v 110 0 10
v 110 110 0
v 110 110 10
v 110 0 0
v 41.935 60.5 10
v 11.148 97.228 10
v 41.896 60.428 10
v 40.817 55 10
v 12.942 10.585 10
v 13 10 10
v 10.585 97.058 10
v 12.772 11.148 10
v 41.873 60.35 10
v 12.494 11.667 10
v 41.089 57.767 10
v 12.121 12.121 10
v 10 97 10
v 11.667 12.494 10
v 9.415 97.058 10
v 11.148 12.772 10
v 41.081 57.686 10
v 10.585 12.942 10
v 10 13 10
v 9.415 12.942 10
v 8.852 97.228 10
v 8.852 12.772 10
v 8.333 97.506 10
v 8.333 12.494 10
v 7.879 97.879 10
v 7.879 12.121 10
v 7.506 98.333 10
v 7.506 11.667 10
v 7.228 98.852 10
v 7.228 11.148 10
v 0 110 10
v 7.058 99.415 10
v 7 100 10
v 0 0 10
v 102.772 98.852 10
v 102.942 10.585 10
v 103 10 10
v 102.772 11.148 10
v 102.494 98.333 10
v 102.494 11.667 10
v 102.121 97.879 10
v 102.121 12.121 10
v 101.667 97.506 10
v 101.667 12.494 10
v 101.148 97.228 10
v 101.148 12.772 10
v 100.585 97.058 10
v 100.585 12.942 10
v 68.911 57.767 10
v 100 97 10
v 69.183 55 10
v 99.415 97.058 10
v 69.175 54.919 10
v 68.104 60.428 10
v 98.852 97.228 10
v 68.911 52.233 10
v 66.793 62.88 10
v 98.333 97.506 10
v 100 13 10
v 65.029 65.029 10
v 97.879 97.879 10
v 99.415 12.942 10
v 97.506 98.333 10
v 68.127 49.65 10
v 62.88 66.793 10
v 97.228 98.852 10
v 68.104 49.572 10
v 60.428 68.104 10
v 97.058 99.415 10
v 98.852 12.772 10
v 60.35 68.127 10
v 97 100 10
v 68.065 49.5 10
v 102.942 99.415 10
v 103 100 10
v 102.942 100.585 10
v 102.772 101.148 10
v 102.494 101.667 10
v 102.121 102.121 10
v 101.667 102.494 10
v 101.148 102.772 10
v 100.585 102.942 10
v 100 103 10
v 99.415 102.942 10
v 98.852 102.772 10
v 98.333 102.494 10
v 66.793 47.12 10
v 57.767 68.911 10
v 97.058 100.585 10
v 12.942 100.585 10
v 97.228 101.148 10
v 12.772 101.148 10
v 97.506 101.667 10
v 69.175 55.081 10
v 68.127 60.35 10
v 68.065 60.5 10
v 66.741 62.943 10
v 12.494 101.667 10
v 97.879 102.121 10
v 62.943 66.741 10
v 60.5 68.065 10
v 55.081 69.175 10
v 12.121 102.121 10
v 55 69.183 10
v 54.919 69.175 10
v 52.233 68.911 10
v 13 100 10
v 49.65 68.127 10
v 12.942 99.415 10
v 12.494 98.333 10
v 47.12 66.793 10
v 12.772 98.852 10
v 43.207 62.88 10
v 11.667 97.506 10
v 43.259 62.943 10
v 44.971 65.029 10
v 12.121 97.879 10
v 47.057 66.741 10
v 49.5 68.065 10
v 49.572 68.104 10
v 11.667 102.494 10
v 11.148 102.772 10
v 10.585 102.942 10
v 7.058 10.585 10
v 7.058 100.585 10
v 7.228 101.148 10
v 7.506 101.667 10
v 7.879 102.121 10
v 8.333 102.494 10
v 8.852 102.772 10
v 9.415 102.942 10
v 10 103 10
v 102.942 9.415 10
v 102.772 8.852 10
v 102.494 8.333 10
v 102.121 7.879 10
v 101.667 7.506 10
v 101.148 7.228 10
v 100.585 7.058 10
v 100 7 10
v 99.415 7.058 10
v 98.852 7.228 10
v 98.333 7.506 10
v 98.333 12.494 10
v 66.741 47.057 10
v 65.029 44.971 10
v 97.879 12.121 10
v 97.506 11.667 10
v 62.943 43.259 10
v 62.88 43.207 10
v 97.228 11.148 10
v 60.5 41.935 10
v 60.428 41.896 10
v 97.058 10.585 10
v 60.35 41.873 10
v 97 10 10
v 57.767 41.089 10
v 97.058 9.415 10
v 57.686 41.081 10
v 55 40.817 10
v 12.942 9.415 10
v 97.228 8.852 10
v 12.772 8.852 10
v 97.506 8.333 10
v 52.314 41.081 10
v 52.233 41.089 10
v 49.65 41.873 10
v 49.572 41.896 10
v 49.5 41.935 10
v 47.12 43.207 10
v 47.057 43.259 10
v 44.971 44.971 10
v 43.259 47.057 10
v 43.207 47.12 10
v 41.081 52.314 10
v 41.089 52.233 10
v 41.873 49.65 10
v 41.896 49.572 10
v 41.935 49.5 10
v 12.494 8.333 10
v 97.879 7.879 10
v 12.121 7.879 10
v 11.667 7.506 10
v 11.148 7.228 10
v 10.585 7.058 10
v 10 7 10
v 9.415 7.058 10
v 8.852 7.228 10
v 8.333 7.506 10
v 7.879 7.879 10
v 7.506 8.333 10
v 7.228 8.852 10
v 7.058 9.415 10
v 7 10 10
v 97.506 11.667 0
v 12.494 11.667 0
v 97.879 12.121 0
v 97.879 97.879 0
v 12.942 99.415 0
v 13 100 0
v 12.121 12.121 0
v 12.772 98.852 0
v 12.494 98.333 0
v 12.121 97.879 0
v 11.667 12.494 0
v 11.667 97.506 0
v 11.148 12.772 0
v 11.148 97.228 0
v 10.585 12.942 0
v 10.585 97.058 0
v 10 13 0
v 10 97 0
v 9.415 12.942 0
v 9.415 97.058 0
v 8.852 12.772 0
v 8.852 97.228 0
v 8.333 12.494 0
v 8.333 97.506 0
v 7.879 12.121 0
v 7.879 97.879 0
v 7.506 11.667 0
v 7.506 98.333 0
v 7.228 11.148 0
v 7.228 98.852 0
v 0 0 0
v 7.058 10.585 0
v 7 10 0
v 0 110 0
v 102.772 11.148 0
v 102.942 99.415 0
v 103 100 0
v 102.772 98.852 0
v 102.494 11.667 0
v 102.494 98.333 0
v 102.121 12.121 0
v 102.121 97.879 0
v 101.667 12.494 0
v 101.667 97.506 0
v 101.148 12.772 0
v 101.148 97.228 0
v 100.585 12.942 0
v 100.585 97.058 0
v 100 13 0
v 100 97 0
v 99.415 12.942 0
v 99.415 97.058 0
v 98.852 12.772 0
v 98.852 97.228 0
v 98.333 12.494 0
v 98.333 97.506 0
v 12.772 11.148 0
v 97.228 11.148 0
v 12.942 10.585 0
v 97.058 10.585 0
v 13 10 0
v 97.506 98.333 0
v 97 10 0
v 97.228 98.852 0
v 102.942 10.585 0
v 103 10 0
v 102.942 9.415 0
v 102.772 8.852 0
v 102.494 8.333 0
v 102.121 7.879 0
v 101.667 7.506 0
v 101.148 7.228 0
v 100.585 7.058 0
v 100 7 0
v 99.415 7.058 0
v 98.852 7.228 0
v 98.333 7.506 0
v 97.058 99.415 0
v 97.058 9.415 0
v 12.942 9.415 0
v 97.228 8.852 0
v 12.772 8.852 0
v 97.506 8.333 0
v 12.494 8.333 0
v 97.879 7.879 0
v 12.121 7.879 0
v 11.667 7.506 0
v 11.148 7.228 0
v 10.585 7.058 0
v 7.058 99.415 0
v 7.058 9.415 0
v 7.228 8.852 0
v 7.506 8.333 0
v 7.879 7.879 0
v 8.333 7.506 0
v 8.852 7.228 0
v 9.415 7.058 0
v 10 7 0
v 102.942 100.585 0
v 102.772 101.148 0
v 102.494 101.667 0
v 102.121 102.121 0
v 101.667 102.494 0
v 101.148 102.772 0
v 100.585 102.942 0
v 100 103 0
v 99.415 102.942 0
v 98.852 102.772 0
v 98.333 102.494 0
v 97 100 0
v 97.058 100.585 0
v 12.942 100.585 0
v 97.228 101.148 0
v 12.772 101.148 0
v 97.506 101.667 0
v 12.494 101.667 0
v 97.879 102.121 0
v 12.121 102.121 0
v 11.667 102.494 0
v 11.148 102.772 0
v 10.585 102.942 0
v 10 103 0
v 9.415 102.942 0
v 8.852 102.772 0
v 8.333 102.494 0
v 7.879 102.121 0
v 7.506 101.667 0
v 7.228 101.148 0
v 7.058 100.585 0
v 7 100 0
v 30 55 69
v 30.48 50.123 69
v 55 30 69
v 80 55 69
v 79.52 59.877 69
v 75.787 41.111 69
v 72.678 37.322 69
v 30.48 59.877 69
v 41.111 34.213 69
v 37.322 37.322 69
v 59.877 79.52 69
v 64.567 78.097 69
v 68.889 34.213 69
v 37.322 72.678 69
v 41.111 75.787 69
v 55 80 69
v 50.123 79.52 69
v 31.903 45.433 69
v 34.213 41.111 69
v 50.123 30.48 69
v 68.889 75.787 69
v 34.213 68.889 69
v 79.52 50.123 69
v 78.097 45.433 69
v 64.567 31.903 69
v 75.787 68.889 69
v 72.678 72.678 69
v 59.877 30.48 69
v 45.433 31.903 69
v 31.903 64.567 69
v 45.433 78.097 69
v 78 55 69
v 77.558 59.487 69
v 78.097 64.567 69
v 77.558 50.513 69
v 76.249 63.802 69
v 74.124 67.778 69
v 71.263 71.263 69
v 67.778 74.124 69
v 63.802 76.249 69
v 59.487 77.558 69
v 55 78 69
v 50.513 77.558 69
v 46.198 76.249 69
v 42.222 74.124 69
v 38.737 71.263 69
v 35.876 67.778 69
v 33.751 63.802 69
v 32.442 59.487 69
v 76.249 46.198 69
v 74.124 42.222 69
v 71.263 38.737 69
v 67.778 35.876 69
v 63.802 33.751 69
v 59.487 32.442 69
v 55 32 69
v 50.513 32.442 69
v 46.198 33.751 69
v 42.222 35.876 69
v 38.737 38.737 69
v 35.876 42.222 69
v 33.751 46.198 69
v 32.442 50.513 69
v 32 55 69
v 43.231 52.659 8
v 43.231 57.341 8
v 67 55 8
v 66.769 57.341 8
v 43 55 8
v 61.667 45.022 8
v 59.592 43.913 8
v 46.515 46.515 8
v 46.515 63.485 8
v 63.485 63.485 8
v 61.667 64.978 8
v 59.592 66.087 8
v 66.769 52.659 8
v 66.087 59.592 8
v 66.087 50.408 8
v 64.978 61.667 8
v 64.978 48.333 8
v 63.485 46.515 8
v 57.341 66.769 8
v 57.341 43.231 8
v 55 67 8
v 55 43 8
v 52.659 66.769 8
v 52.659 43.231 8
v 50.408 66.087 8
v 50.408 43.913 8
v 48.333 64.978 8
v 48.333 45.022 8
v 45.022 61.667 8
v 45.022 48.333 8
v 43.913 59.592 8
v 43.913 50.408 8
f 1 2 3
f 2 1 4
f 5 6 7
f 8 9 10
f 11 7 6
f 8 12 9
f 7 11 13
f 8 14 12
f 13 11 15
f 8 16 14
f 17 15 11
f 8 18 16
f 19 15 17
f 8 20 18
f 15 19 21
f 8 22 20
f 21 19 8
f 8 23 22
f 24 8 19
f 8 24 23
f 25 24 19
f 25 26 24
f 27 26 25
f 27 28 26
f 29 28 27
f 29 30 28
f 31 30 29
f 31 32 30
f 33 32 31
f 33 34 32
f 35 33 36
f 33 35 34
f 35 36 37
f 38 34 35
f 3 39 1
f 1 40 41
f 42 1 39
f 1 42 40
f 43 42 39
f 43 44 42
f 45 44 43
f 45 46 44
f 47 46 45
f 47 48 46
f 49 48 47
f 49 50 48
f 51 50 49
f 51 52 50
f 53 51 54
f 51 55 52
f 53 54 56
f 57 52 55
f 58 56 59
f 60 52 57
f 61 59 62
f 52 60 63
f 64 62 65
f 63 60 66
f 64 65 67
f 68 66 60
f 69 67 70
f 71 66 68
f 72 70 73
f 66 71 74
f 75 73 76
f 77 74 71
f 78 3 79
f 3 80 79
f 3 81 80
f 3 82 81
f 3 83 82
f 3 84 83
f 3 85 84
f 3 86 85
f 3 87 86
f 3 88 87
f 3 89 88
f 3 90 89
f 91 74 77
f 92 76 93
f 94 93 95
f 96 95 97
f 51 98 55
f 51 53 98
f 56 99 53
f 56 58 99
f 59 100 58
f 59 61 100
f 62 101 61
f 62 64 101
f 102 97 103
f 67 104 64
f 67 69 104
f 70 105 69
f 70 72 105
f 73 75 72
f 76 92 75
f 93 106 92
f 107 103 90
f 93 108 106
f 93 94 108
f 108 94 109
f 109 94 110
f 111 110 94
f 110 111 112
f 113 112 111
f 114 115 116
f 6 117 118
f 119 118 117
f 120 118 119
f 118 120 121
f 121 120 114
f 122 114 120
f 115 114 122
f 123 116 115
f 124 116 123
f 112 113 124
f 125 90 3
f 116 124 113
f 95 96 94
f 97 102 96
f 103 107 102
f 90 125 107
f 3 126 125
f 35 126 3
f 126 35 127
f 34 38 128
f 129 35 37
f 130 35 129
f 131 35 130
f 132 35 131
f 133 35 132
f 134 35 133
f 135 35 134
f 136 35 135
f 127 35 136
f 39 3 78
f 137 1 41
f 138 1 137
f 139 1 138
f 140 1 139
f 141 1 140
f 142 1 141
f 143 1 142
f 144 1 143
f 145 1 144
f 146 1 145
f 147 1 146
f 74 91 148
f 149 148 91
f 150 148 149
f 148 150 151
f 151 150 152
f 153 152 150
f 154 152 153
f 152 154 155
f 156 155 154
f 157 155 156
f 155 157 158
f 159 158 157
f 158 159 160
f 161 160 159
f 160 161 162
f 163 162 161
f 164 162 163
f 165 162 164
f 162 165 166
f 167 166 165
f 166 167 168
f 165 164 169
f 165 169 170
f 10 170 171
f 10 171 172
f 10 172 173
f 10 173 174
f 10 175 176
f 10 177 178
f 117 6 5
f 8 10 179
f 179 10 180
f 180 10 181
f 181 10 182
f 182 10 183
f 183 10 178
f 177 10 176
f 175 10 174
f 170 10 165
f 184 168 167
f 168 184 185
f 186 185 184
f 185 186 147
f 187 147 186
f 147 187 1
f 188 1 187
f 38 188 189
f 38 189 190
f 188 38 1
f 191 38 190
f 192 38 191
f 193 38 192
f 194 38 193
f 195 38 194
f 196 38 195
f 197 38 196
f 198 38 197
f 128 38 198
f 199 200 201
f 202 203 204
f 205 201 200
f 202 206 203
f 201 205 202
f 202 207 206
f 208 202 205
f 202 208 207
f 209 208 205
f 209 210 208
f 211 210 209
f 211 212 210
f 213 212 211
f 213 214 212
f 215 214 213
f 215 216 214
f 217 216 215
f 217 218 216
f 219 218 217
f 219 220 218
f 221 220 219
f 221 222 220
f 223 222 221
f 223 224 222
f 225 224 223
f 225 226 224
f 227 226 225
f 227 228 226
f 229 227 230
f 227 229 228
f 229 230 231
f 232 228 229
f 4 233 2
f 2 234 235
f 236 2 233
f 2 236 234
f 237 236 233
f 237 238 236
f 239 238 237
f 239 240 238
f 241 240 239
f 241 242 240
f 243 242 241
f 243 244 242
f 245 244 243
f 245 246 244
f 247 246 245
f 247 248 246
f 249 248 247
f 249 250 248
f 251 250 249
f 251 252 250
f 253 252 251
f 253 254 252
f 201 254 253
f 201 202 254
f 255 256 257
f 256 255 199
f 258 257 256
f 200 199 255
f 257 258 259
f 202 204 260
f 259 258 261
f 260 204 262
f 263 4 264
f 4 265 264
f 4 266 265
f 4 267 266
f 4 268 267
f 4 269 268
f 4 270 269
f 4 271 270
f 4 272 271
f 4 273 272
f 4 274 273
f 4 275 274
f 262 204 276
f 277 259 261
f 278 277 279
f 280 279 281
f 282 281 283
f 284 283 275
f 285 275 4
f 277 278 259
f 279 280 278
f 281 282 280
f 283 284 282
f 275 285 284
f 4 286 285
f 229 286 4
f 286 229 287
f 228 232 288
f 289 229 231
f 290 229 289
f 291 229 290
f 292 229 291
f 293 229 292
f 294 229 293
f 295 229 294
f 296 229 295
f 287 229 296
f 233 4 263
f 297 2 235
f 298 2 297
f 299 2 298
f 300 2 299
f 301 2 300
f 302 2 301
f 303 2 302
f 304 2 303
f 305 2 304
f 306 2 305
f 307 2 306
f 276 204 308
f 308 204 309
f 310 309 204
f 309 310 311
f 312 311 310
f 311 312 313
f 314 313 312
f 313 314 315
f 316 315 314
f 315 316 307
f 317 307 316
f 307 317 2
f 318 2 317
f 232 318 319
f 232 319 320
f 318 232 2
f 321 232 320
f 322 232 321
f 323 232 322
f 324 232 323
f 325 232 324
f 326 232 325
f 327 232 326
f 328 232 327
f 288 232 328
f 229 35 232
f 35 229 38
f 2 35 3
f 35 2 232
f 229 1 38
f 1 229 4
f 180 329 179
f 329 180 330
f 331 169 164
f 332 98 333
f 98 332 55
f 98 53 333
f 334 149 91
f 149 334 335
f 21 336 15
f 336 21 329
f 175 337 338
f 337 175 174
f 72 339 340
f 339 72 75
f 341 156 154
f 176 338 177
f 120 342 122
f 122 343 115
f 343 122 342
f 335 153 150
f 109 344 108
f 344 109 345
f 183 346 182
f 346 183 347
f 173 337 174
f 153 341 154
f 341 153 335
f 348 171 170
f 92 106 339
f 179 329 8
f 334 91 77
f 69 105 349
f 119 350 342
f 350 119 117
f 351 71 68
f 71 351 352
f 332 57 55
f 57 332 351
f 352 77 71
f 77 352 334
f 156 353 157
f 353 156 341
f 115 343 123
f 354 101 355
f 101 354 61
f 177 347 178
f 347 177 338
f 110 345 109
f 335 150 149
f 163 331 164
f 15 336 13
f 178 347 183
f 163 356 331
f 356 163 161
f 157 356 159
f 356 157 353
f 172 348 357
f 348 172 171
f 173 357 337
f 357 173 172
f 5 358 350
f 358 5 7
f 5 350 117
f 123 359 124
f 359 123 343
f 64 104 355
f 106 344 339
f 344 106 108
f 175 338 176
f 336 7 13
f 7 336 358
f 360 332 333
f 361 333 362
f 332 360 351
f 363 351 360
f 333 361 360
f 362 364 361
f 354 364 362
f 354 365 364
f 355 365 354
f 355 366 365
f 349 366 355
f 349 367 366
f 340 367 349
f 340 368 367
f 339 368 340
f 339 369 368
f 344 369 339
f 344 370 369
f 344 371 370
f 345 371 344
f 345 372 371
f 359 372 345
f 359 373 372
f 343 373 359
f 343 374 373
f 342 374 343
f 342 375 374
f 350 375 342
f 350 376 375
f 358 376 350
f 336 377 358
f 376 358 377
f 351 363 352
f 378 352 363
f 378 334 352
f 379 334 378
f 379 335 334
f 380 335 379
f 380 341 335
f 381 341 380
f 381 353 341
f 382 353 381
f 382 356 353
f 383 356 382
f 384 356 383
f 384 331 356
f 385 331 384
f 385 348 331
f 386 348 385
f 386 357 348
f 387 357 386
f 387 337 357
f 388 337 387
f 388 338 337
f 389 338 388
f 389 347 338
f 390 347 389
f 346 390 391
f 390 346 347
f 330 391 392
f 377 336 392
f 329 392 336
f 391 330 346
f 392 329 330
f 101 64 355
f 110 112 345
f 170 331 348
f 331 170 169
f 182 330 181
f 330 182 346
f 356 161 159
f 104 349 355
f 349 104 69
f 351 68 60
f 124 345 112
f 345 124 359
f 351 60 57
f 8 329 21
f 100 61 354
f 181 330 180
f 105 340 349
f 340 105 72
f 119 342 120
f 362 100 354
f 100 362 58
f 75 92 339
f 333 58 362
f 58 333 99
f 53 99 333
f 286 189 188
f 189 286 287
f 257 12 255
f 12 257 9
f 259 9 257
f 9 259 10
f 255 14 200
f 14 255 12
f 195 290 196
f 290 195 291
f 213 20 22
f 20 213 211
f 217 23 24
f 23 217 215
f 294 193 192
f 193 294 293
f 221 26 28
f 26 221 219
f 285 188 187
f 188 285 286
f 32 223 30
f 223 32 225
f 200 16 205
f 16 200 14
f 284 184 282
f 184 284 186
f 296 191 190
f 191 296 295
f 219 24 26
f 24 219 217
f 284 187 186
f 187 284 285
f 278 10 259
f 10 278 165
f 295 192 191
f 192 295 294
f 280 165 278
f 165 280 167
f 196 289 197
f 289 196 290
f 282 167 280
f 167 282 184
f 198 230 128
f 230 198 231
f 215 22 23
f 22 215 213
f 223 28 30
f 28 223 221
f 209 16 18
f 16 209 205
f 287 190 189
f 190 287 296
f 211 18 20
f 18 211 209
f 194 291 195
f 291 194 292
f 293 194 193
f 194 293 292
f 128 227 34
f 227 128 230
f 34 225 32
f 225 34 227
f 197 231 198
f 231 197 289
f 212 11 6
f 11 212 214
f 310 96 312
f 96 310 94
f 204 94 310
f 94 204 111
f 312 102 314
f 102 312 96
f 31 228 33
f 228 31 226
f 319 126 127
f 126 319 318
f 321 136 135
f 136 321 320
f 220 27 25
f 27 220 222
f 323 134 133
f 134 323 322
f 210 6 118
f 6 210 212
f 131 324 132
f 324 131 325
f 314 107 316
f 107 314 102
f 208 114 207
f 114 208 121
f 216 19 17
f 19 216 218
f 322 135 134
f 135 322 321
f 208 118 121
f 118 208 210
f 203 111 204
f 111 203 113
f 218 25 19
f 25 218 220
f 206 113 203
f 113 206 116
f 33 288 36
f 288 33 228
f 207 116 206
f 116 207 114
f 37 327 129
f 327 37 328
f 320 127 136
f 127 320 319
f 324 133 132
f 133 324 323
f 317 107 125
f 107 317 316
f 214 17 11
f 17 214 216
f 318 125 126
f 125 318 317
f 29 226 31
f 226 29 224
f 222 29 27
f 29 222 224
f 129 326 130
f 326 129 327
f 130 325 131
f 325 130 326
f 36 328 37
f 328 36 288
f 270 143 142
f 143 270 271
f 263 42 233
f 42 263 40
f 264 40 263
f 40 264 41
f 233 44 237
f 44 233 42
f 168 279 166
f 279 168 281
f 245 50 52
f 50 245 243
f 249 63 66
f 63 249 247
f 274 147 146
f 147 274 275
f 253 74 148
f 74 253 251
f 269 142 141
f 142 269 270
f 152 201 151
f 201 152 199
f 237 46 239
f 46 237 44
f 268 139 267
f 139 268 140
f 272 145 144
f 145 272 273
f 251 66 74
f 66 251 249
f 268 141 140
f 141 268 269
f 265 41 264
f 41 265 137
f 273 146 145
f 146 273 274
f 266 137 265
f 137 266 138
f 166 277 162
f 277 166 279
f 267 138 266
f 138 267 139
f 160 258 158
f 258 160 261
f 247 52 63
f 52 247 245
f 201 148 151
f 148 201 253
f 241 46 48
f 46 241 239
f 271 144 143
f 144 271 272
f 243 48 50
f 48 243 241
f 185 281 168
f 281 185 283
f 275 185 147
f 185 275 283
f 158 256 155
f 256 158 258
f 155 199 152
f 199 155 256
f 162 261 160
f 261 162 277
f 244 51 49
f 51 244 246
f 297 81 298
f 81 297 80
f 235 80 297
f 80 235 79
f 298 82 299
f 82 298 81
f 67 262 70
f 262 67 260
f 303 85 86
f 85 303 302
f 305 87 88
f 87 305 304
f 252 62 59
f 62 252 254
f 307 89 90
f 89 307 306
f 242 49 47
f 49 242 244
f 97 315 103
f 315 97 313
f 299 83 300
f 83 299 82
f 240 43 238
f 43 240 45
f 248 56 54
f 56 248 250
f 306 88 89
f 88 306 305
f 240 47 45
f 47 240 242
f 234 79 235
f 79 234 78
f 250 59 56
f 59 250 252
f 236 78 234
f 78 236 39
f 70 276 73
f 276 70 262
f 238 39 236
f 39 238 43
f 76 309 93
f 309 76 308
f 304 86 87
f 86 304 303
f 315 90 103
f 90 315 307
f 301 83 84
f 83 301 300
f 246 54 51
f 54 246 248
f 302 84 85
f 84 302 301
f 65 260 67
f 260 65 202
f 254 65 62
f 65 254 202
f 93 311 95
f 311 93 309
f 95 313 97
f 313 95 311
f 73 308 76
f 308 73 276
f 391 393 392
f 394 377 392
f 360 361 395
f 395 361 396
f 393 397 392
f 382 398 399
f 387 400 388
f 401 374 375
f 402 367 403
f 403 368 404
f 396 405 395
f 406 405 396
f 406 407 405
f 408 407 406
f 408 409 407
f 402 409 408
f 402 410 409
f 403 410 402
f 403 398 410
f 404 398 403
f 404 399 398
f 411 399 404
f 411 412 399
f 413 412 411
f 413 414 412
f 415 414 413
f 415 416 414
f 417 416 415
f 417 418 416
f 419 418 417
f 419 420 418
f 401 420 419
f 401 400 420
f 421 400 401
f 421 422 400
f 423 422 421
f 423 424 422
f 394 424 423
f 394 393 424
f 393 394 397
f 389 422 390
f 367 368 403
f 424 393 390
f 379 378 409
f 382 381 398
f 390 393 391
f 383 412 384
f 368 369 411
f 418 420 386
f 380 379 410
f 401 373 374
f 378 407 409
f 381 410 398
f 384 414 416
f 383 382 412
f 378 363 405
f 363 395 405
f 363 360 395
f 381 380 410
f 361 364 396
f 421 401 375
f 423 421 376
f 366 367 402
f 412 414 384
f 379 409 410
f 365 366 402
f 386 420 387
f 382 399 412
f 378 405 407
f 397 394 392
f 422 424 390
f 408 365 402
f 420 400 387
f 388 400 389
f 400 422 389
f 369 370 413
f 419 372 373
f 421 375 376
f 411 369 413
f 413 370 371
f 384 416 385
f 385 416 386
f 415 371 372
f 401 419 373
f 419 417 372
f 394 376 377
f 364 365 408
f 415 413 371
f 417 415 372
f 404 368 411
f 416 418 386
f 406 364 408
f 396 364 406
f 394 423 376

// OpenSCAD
$fn = 32;

// ----------------------------------------------------------------------
// Hopper: flanged with square flange
// ----------------------------------------------------------------------

// --- parameters (mm) ---
fl = 110;                 // flange side, X and Y
fl_t = 10;                // flange thickness
cone_h = 60;              // cone height above the flange
top_d = 50;               // cone mouth diameter
bot_d = 28;               // cone spout diameter
wall = 2;                 // cone wall thickness
hole_r = 3;               // flange hole radius
hole_in = 10;             // hole inset from the corners
fit_tol = 0.05;           // tolerance for press fits, mm
free_tol = 0.3;           // tolerance for clearance fits, mm

bore_d = bot_d - 2 * wall;  // spout bore diameter
total_h = fl_t + cone_h - 1;  // overall height

difference() {
  union() {
    cube([fl, fl, fl_t]);
    translate([fl / 2, fl / 2, fl_t - 1])
      cylinder(h = cone_h, d1 = bot_d, d2 = top_d);
  }
  translate([fl / 2, fl / 2, fl_t - 2])
    cylinder(h = cone_h + 1, d1 = bore_d, d2 = top_d - 2 * wall);
  for (sx = [0, 1], sy = [0, 1])
    translate([sx ? fl - hole_in : hole_in,
               sy ? fl - hole_in : hole_in, -1])
      cylinder(r = hole_r, h = fl_t + 2);
}
